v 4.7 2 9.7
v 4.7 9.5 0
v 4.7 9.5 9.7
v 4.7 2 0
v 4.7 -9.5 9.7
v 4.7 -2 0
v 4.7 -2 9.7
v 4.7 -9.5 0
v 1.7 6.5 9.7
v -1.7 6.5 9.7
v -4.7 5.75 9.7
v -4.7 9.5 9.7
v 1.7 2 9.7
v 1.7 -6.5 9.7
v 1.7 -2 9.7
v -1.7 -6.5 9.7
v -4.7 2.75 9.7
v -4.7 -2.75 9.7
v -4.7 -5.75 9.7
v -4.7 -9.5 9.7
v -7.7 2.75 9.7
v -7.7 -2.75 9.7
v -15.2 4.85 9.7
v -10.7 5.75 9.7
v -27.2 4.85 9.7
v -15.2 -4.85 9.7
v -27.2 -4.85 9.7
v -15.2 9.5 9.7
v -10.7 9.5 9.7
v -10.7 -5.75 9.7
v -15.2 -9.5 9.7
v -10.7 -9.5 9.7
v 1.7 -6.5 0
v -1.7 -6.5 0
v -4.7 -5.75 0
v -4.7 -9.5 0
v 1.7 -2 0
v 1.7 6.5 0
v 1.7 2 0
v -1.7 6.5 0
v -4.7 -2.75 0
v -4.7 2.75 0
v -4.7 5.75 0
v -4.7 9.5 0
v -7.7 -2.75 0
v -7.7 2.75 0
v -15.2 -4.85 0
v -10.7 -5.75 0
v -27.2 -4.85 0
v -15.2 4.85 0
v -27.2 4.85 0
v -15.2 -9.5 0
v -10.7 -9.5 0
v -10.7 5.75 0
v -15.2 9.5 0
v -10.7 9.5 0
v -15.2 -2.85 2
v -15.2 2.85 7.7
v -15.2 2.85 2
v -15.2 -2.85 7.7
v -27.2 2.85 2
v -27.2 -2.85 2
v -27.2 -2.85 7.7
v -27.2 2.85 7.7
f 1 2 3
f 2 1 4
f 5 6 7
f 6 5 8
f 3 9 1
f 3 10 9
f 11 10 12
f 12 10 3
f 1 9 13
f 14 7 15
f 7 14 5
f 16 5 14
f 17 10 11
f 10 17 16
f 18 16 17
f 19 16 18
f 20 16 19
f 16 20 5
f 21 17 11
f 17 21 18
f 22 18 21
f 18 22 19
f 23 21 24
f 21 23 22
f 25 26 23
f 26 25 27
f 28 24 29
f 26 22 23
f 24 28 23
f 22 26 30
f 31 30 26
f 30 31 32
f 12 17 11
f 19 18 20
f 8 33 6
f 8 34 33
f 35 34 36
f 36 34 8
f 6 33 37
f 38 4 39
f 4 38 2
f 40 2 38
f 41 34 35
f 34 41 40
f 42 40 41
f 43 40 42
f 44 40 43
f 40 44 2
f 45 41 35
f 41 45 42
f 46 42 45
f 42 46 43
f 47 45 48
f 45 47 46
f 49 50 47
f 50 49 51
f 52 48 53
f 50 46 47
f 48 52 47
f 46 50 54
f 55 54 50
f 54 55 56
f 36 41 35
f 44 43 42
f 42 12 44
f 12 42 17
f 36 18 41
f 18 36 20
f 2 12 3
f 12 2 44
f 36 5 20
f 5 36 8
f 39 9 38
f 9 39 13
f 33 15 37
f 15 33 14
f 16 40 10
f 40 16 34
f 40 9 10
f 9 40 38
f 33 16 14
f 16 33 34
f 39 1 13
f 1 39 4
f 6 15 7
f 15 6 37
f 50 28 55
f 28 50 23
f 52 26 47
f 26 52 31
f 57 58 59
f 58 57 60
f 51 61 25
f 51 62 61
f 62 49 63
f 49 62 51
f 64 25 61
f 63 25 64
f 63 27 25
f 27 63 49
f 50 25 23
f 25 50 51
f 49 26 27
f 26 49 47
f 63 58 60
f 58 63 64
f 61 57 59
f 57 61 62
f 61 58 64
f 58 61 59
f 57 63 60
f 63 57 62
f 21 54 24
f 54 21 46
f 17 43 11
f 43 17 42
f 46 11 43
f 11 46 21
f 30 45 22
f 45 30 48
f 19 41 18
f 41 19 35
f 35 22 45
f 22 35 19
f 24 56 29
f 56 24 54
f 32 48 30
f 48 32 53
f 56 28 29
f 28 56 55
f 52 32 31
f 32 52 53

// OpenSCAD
// ----------------------------------------------------------------
// Customizable Socket Organizers: Rail (Rectangular Cross Section)
// ----------------------------------------------------------------
//
// Zemba Craftworks
// youtube.com/zembacraftworks
// thingiverse.com/zembacraftworks/about

// This is a configurable, 3D printable insert designed to
// slide onto a metal or wooden bar to create socket set
// organizers. Dimensions can be adjusted for sockets of
// all sizes and to slide onto bars/holders of any size.

// Date Created:  2018-07-30
// Last Modified: 2018-12-19

// Critical Dimensions
// -------------------
// Adjust these dimensions and verify them with a test print
// before printing holders for all of your sockets! You want a
// snug fit but not so tight that anything gets stuck. These
// values will vary depending on your sockets, the rail you're
// using, and the calibration of your printer.

d  = 9.7;           // Socket Drive Width (mm)
                    // (9.7 = approximately 3/8 in * 25.4 mm/in)

dh = 12;            // Socket Drive Height (mm)
                    // May or may not be limited by the design
                    // of your sockets
                    
rx = 3.4;           // Rail Cross-Section Height (mm)
                    // (3.4 = approximately 1/8 in * 25.4 mm/in)
                    
ry = 13;            // Rail Cross-Section Width (mm)
                    // (13 = approximately 1/2 in * 25.4 mm/in)
                    
// Other Dimensions 
// ----------------
// These dimensions are not as critical to the fit, but can be
// adjusted to suit your preferences.

dw = 2;             // Drive Wall Thickness (mm)
                    // Set to d/2 to make the drive post solid
ds = 5.5;           // Drive Stand Width (mm)
                    // (region between clamp and flange)
ct = 3;             // Wall Thickness of Rail Clamp (mm)
ch = d;             // Height of Rail Clamp (mm)
                    // (generally ch = d)                    
cg = 4;             // Bottom Gap of Rail Clamp (mm)
                    // (adds some flex when attaching to rail)
fa = 6;             // Flange Height above Rail Clamp (mm)
fc = 3;             // Flange Chamfer Width (mm)
fw = ry+2*ct;       // Flange Width (mm)
                    // (fw = ry+2*ct = flush with clamp)
ft = 1.5*ct;        // Flange Thickness (mm)

// Nub Dimensions (Optional)
// ------------------
// This imitates the spring-loaded bearing on the socket wrench which
// mates to the internal notch or side hole of the socket. However,
// you may have better success without it. Depending on your print
// it may snap off or deform easily when inserting into the socket.

enableNub = false;  // Enable Nub for Socket
nw = 3;             // Nub Width (mm)
nt = 0.5;           // Nub Height (mm)
nh = 5.5;           // Nub Distance from Flange (mm)
nr = 0.49;          // Radius of Curved Nub Edge (must be <= nt)
fn1 = 20;           // Number of Facets for Nub Curvature 

// Tolerance Value
// ---------------
// When shapes are subtracted through difference() in
// OpenSCAD, there is ambiguity if any faces of the two shapes
// occupy the same space. Adding a small value 't' to make
// the subtracted shape slightly larger prevents this.

t = 0.1;

difference(){
// Create Socket Organizer:
union(){
    
    // Rail Clamp
    difference(){
        // Rail Clamp Full Area
        translate([-(rx+2*ct)/2, -(ry+2*ct)/2, 0]){
            cube([rx + 2*ct, ry + 2*ct, ch]);    }    
        // Rail Cross Section
        translate([-rx/2, -ry/2, -t/2]){
            cube([rx, ry, ch+t]);    }    
        // Rail Clamp Gap
        translate([rx/2-t/2, -cg/2, -t/2]){
            cube([ct+t, cg, ch+t]);}}

    // Socket Drive
    difference(){    
        // Socket Drive Exterior
        translate([-dh-rx/2-ct-fa-ft,-d/2,0]){
            cube([dh,d,d]);}
        // Socket Drive Interior
        translate([-dh-rx/2-ct-fa-ft-t/2,-(d-2*dw)/2,dw]){
            cube([dh+t,d-2*dw,d-2*dw]);}}

    // Socket Drive Flange
    translate([-rx/2-ct-ft-fa,-fw/2,0]){
        cube([ft,fw,d]);    }

    // Socket Drive Support
    translate([-rx/2-ct-fa,-ds/2,0]){
        cube([fa,ds,d]);}

    // Create Nub (Optional)
    // (+0.0001 ensures cube is not height 0 when nt = nr)
    if (enableNub){
        translate([nr-nw-rx/2-ct-fa-ft-nh,nr-nw/2,nr-nt+d]){
            difference(){
                minkowski(){
                    sphere(r=nr,$fn=fn1);
                    cube([nw-2*nr,nw-2*nr,2*nt-2*nr+0.0001]);}
                translate([-nr,-nr,-nr]){
                    cube([nw,nw,nt]);}}}}

    // Chamfers
    translate([-rx/2-ct-fa,ds/2,0]){
        chamfer(fc,d,t);}
    translate([-rx/2-ct,ds/2,0]){
        rotate([0,0,90]){    
            chamfer(fc,d,t);}}
    translate([-rx/2-ct-fa,-ds/2,0]){
        rotate([0,0,-90]){    
            chamfer(fc,d,t);}}
    translate([-rx/2-ct,-ds/2,0]){
        rotate([0,0,-180]){    
            chamfer(fc,d,t);}}
}
}

// Chamfer Module
// Creates an interior chamfered edge w x w x h
module chamfer(w,h,t){
    hyp = sqrt(pow(w,2)+pow(w,2)); // Hypotenuse Distance
    difference(){
    cube([w,w,h]);
    translate([w,0,-t/2]){
        rotate([0,0,45]){
            cube([hyp,hyp,h+t]);}}}}
